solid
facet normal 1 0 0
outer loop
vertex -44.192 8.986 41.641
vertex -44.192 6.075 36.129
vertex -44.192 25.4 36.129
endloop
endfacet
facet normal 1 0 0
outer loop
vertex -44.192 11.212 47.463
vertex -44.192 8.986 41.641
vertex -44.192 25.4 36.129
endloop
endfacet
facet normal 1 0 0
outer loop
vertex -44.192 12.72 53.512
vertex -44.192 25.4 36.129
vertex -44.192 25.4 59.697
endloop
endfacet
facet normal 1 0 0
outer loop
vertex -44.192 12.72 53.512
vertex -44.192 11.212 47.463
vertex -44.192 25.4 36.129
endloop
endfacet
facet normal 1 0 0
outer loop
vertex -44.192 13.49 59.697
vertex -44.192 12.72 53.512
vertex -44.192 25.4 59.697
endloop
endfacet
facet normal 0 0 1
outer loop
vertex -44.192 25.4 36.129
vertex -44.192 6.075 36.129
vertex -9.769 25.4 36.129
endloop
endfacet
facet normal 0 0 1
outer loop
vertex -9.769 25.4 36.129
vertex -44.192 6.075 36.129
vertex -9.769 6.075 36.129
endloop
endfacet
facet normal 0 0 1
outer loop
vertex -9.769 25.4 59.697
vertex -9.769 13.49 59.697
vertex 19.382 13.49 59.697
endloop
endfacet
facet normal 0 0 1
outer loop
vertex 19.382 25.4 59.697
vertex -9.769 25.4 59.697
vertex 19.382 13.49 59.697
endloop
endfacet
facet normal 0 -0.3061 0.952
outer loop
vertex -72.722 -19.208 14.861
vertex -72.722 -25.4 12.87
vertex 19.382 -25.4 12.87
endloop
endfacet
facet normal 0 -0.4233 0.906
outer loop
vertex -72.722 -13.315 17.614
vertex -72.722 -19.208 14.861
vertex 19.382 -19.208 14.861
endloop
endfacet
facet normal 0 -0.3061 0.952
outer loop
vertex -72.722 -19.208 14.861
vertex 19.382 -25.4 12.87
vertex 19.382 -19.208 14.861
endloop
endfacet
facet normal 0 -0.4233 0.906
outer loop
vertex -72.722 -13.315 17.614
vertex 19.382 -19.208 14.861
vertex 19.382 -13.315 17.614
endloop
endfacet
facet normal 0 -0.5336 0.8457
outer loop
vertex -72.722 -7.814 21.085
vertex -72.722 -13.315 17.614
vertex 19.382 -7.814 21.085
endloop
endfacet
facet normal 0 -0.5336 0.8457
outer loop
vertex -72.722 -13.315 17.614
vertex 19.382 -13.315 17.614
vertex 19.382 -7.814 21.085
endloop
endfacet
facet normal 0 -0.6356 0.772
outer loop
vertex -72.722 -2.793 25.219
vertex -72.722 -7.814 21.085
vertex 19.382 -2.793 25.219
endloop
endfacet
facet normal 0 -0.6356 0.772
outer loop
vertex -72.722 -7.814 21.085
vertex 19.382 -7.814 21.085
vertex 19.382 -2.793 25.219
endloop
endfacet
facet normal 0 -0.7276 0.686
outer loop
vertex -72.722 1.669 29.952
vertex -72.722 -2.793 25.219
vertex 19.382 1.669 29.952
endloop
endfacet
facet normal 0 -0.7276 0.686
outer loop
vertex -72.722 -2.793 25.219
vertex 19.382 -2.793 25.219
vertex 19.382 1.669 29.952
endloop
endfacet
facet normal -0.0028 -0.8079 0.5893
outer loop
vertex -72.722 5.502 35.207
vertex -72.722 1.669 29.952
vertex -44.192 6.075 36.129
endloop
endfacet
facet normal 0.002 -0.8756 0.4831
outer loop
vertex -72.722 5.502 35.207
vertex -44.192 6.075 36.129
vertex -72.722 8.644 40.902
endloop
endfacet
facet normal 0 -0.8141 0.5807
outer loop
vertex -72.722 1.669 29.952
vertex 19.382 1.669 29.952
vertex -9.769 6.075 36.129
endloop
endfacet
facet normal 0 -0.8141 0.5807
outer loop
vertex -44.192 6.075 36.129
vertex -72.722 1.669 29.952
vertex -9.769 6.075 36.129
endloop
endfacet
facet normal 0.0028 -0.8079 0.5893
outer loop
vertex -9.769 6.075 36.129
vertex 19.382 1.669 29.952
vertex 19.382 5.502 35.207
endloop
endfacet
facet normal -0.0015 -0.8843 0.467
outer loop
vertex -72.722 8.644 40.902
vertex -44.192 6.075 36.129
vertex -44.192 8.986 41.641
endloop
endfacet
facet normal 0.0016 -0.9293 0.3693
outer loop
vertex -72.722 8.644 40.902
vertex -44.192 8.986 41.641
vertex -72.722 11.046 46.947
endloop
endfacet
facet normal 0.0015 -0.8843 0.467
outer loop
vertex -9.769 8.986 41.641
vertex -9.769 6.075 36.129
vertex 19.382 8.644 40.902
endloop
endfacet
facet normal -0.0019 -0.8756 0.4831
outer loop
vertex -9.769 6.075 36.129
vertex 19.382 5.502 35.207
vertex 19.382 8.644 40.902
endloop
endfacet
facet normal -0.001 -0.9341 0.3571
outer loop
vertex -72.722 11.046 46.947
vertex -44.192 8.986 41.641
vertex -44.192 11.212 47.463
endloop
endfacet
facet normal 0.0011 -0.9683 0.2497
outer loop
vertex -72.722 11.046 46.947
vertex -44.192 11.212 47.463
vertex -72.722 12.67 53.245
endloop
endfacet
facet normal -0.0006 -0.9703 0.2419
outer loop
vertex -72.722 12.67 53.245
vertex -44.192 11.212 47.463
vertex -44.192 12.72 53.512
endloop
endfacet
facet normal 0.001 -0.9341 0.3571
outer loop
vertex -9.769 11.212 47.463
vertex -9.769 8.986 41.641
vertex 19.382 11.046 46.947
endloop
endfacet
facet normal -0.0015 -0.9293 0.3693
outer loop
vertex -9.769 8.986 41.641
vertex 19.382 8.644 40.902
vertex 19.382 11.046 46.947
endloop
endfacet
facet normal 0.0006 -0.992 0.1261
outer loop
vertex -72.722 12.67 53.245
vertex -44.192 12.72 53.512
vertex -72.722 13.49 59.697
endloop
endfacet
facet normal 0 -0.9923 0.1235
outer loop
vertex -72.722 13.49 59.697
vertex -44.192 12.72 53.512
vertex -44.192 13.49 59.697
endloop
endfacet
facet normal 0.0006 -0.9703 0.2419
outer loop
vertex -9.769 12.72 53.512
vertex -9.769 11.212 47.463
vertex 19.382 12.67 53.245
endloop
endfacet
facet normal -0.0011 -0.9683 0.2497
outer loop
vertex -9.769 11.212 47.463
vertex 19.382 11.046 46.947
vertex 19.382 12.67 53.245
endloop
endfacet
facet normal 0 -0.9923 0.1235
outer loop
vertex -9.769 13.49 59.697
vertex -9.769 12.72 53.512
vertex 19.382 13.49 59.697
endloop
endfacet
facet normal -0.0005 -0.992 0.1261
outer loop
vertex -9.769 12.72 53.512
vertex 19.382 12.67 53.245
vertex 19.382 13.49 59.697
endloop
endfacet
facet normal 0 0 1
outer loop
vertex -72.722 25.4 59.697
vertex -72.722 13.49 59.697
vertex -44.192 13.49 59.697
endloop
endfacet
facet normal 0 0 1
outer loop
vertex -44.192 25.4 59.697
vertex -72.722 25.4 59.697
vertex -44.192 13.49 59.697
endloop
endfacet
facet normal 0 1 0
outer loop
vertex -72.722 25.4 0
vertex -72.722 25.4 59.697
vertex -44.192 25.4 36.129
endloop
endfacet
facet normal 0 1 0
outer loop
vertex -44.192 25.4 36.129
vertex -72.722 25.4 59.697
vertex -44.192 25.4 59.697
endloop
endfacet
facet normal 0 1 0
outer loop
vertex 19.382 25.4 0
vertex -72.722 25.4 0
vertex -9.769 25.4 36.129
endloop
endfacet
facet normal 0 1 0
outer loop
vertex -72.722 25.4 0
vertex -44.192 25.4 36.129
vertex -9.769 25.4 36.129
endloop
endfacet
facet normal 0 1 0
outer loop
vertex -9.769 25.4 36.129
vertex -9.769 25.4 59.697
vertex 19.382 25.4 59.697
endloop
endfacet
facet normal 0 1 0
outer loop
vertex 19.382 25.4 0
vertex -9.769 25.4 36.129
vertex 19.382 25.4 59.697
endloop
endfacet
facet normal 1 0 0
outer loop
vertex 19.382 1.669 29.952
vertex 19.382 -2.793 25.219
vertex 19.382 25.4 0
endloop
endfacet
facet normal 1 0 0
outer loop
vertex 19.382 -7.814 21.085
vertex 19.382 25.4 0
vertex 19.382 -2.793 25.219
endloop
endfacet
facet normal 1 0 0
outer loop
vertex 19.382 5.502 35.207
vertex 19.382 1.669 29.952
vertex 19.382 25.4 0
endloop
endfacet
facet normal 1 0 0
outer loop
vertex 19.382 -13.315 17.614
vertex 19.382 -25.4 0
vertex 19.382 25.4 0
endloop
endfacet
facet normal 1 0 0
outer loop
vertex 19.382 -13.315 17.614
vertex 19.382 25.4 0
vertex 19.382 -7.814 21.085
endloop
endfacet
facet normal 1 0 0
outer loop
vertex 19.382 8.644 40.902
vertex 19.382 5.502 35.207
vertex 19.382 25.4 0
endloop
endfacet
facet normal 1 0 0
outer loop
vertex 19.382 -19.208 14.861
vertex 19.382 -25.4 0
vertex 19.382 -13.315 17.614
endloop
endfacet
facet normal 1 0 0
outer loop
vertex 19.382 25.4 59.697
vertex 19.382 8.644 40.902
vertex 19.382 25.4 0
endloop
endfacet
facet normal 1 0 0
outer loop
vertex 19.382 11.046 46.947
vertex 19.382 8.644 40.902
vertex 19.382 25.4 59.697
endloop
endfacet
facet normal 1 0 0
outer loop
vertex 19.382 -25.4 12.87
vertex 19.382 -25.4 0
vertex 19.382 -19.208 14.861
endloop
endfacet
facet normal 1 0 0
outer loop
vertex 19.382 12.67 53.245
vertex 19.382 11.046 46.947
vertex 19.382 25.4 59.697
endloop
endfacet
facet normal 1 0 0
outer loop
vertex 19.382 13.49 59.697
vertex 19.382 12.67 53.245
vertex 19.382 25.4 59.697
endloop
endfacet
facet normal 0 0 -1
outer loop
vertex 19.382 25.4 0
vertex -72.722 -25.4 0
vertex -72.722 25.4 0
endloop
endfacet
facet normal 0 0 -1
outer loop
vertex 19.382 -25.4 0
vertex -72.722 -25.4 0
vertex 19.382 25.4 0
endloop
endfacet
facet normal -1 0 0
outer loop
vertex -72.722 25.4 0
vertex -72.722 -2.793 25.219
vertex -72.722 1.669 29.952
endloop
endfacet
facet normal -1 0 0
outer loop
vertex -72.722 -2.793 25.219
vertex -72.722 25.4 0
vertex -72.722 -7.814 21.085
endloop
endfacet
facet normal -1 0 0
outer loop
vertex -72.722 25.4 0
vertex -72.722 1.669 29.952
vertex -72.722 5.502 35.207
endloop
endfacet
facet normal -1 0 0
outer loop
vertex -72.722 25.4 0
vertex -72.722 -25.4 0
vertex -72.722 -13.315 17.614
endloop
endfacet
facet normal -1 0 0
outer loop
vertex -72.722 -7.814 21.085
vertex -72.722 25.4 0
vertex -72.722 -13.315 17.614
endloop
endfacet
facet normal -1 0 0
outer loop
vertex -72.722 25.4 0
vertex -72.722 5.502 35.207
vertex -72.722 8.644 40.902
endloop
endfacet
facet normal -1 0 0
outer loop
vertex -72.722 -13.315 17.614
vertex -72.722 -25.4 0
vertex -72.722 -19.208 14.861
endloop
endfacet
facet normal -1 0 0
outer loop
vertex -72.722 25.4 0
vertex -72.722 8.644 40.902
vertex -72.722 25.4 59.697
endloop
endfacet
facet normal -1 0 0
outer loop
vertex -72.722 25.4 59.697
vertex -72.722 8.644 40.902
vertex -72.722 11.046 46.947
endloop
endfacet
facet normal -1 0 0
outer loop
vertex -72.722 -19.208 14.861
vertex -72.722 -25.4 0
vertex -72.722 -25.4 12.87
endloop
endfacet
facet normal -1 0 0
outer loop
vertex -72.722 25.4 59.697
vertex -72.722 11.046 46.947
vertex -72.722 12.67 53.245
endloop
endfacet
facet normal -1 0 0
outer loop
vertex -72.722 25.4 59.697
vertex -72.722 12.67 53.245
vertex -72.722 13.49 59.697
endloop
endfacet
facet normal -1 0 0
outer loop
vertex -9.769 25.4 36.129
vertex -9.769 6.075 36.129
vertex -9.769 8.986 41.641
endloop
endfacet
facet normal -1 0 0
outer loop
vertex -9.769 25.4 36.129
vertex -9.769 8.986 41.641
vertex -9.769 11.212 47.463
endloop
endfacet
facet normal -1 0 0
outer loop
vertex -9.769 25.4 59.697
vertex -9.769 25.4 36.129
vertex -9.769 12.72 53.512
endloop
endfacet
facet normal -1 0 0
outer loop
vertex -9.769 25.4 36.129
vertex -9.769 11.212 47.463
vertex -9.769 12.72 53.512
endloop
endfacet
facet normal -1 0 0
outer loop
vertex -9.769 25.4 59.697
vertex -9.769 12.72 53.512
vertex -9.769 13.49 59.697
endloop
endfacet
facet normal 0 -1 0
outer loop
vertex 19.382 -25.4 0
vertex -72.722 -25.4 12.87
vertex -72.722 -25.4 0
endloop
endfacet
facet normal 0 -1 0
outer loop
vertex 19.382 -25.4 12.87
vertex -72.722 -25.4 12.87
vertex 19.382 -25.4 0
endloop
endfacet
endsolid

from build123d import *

# Parameters (mm, degrees)
F0_W     = 92.1045392752
F0_H     = 59.6973858774
F1_DEPTH = 25.4
F2_DEPTH = 25.4
F4_W     = 34.4229061157
F4_H     = 23.5688388348
F5_DEPTH = 70.612
F6_DEPTH = 99.568


with BuildPart() as f1:
    # F0 (on Front) → F1 (new body)
    with BuildSketch(Plane.XZ):
        with Locations((-26.6700014472, 29.8486929387)):
            Rectangle(F0_W, F0_H)
    extrude(amount=F1_DEPTH)

    # F2 (add): a face of the model
    f2_faces = [f1.faces().sort_by_distance(p)[0] for p in [
        (-26.6700014472, 0, 29.8486929387),
    ]]
    extrude(f2_faces, amount=F2_DEPTH)

    # F4 (on face) → F5 (cut)
    with BuildSketch(Plane.XZ.offset(25.4)):
        with Locations((-26.9801160321, 47.91296646)):
            Rectangle(F4_W, F4_H)
    extrude(amount=-F5_DEPTH, mode=Mode.SUBTRACT)

    # F3 (on face) → F6 (cut)
    with BuildSketch(Plane.YZ.offset(19.3822681904)):
        with BuildLine():
            Line((-25.4, 59.6973858774), (-25.4, 12.8698255867))
            ThreePointArc((-25.4, 12.8698255867), (1.6694190997, 29.9515872227), (13.4900575504, 59.6973858774))
            Line((13.4900575504, 59.6973858774), (-25.4, 59.6973858774))
        make_face()
    extrude(amount=-F6_DEPTH, mode=Mode.SUBTRACT)


solid = f1.part
